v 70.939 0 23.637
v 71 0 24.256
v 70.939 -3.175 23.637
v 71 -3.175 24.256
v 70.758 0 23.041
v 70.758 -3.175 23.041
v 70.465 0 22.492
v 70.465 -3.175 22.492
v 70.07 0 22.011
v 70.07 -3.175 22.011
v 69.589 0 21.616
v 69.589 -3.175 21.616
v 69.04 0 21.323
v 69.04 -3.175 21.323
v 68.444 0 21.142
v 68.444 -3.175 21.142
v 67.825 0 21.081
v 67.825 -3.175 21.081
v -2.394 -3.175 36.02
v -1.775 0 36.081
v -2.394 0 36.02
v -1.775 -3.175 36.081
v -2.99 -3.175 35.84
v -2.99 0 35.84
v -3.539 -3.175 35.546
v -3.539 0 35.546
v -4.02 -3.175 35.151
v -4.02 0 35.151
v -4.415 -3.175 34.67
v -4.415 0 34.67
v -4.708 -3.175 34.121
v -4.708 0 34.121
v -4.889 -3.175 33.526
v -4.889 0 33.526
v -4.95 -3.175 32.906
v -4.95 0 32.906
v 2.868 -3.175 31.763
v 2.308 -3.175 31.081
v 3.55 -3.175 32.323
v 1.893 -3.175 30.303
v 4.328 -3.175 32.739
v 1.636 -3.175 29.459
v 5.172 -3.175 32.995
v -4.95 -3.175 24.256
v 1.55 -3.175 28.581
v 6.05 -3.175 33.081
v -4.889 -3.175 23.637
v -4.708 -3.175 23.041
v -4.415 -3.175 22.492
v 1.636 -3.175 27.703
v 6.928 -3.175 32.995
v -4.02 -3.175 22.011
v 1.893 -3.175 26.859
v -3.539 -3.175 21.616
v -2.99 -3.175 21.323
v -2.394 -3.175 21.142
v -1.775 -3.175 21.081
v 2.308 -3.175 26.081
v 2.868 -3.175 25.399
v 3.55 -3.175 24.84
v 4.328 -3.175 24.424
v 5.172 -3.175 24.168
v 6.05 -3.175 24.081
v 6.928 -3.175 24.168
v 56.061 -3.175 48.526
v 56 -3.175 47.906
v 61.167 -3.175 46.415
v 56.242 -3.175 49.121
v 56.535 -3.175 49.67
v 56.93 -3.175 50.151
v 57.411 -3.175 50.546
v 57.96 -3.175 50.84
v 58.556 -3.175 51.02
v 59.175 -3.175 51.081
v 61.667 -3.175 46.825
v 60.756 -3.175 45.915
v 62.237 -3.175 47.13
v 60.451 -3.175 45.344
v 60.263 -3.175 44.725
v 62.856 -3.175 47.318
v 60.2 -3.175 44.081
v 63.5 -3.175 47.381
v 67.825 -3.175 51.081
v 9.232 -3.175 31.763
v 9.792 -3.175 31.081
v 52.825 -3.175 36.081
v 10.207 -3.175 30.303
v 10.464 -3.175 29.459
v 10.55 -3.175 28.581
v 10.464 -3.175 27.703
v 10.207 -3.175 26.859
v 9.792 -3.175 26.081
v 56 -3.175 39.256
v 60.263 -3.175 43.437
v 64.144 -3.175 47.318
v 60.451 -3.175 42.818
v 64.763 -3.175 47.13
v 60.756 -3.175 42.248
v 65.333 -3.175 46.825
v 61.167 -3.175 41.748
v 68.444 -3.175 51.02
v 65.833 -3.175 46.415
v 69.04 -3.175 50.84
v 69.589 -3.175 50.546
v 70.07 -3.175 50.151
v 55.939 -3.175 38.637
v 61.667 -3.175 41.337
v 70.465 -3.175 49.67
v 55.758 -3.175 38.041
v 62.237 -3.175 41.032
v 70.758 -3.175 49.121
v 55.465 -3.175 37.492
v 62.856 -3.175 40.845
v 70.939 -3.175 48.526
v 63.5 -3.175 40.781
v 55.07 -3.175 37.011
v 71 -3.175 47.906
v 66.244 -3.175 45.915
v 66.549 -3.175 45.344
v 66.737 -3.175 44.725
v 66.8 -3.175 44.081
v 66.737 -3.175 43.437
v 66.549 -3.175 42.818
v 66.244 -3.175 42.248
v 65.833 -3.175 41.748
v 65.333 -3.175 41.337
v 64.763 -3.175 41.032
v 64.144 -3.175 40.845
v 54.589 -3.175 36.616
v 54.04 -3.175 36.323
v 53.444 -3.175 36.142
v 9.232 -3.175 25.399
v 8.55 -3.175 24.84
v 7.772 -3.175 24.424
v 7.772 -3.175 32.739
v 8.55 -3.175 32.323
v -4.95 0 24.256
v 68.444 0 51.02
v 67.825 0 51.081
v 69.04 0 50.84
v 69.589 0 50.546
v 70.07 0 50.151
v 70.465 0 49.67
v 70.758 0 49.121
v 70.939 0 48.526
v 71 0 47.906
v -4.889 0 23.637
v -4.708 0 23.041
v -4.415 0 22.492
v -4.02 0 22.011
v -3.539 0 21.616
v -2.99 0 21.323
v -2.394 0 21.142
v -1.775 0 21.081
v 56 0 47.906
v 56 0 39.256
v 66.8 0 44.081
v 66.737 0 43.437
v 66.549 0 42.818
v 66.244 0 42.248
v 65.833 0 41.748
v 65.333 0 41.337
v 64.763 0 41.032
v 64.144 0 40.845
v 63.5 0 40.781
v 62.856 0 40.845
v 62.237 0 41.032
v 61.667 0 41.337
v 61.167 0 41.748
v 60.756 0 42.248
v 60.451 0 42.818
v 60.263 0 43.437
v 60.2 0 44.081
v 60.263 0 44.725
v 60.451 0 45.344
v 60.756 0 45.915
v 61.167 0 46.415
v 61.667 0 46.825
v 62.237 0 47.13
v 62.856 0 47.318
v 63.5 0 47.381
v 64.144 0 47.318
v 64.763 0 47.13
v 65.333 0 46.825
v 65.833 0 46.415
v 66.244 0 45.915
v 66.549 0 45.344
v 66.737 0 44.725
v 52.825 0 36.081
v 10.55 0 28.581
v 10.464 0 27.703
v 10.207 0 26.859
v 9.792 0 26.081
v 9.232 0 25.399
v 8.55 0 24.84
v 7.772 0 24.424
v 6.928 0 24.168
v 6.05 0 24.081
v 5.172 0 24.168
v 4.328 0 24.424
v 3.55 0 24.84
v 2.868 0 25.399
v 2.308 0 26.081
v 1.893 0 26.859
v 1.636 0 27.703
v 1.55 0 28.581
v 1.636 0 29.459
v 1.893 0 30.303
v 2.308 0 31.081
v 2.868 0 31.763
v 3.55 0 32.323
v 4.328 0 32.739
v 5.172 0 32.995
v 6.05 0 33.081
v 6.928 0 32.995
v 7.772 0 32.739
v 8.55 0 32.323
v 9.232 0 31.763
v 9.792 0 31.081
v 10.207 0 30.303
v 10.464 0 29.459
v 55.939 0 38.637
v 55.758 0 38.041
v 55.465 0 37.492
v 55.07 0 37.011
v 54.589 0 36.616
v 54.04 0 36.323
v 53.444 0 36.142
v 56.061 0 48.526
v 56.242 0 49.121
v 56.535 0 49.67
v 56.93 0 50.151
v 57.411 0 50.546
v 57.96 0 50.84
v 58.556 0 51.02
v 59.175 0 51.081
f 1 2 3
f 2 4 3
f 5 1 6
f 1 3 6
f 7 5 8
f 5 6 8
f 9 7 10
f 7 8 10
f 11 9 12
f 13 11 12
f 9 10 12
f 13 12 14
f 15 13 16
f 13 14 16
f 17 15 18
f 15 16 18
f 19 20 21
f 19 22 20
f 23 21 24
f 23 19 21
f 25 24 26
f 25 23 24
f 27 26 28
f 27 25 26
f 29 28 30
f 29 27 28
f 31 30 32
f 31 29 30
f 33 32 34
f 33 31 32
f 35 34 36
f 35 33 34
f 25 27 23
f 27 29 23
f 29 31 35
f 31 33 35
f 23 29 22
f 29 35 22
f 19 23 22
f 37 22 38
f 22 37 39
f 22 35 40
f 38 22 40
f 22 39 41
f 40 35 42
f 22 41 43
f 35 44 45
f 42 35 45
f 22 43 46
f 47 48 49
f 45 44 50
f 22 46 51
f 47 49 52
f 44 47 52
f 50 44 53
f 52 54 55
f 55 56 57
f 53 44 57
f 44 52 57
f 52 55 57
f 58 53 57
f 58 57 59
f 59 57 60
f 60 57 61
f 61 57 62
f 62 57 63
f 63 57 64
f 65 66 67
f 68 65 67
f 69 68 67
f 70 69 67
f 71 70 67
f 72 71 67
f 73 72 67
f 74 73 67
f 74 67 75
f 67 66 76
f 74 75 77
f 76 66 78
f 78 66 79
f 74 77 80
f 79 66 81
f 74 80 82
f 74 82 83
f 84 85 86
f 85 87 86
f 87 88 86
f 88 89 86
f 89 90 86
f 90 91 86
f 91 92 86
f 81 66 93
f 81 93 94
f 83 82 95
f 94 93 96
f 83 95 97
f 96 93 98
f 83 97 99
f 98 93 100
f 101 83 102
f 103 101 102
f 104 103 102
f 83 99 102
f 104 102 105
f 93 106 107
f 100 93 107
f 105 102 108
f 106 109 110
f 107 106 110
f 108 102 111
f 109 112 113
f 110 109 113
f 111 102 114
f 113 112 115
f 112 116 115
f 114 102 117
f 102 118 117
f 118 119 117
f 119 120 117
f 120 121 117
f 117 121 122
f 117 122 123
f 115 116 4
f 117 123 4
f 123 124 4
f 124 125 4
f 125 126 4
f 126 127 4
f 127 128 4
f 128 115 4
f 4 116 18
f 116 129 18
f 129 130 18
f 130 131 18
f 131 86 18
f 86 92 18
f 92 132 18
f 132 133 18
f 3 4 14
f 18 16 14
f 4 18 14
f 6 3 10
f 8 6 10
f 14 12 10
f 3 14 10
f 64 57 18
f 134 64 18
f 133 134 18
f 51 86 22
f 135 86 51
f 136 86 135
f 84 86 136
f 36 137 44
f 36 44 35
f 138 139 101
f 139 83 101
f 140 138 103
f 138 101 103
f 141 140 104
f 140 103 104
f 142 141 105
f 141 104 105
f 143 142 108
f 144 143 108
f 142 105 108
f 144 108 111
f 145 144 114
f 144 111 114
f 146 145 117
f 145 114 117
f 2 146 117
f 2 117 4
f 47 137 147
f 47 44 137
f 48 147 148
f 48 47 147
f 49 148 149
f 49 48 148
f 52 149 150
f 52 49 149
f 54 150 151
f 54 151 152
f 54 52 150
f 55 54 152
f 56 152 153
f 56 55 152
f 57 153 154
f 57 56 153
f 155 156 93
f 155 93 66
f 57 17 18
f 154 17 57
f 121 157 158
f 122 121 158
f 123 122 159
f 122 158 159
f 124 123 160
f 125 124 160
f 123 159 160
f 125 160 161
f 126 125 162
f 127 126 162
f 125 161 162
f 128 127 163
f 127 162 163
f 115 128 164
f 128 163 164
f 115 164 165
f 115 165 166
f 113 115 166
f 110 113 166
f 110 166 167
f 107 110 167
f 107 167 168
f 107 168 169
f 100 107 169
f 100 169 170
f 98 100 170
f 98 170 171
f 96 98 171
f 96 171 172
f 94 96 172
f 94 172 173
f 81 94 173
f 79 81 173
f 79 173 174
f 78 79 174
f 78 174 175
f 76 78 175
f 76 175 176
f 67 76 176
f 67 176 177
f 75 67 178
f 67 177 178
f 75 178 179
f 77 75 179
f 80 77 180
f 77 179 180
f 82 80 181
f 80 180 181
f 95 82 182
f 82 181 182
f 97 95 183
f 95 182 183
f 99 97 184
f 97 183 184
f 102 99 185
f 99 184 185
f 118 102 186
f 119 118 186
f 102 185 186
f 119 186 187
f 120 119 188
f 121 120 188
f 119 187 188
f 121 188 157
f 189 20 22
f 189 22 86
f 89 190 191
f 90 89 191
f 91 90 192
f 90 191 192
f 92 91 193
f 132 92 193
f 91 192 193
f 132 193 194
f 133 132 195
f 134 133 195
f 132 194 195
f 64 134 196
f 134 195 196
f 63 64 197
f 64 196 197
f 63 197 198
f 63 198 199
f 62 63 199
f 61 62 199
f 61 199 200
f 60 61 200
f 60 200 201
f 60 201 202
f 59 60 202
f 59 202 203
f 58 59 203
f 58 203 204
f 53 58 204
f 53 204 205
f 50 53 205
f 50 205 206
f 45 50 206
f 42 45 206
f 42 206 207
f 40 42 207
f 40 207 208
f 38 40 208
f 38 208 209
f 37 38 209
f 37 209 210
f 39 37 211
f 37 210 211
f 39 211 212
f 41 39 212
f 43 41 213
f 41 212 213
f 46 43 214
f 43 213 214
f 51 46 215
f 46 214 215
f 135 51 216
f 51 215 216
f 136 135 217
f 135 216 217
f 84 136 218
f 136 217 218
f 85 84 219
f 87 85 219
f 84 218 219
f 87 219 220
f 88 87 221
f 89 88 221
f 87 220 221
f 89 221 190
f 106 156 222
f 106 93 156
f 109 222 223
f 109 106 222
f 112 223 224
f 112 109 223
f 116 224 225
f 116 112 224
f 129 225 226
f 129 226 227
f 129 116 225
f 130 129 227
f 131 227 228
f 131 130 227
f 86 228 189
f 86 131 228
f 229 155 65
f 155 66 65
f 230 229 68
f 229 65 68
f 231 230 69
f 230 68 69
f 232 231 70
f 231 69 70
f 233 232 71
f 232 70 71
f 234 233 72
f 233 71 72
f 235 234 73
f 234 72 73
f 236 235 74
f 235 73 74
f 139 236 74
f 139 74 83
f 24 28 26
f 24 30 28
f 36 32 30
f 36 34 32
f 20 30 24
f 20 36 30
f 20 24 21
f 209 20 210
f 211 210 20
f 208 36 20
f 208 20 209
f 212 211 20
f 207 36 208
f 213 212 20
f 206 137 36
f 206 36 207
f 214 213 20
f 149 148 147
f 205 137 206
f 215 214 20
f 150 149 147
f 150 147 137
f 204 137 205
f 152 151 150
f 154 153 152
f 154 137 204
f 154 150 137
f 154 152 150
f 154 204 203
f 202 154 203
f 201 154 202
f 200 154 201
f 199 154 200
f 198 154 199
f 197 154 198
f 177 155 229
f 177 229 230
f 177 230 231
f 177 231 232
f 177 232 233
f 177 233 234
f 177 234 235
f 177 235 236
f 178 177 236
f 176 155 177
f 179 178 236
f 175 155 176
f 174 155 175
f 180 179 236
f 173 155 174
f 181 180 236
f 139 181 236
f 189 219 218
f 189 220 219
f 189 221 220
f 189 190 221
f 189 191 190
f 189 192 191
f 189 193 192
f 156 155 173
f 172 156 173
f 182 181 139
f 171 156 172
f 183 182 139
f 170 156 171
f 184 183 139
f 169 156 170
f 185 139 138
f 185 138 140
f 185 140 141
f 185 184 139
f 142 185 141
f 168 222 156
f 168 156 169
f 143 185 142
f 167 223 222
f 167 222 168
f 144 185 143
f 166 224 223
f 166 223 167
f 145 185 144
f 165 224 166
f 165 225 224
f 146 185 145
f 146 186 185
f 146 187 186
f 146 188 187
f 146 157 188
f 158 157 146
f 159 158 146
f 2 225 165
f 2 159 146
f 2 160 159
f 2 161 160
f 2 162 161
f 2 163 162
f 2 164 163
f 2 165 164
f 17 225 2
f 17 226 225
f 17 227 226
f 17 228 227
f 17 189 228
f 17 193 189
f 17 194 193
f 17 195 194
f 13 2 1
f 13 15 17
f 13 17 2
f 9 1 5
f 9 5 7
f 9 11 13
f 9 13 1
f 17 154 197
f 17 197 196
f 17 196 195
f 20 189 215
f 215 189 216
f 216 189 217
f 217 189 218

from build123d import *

# Parameters (mm, degrees)
BOSS_EXTRUDE1_DEPTH  = 3.175
M8_CLEARANCE_HOLE1_D = 9
M6_CLEARANCE_HOLE1_D = 6.6
FILLET1_R            = 3.175


with BuildPart() as part:
    # Sketch1 → Boss-Extrude1 (new body)
    with BuildSketch(Plane(origin=(0, 0, 0), x_dir=(1, 0, 0), z_dir=(0, 1, 0))):
        Polygon((6.05, -36.0812086), (56, -36.0812086), (56, -44.0812086), (56, -51.0812086), (71, -51.0812086), (71, -44.0812086), (71, -21.0812086), (6.05, -21.0812086), (-4.95, -21.0812086), (-4.95, -36.0812086), align=None)
    extrude(amount=-BOSS_EXTRUDE1_DEPTH)

    # M8 Clearance Hole1 (through all)
    with Locations(Plane(origin=(0, -3.175, 0), x_dir=(-1, 0, 0), z_dir=(0, -1, 0))):
        with Locations((-6.05, -28.5812086)):
            Hole(M8_CLEARANCE_HOLE1_D / 2)

    # M6 Clearance Hole1 (through all)
    with Locations(Plane(origin=(0, -3.175, 0), x_dir=(-1, 0, 0), z_dir=(0, -1, 0))):
        with Locations((-63.5, -44.0812086)):
            Hole(M6_CLEARANCE_HOLE1_D / 2)

    # Fillet1
    fillet1_edges = [part.edges().sort_by_distance(p)[0] for p in [
        (71, -1.5875, 51.0812086),
        (56, -1.5875, 51.0812086),
        (56, -1.5875, 36.0812086),
        (-4.95, -1.5875, 36.0812086),
        (-4.95, -1.5875, 21.0812086),
        (71, -1.5875, 21.0812086),
    ]]
    fillet(fillet1_edges, radius=FILLET1_R)


solid = part.part
